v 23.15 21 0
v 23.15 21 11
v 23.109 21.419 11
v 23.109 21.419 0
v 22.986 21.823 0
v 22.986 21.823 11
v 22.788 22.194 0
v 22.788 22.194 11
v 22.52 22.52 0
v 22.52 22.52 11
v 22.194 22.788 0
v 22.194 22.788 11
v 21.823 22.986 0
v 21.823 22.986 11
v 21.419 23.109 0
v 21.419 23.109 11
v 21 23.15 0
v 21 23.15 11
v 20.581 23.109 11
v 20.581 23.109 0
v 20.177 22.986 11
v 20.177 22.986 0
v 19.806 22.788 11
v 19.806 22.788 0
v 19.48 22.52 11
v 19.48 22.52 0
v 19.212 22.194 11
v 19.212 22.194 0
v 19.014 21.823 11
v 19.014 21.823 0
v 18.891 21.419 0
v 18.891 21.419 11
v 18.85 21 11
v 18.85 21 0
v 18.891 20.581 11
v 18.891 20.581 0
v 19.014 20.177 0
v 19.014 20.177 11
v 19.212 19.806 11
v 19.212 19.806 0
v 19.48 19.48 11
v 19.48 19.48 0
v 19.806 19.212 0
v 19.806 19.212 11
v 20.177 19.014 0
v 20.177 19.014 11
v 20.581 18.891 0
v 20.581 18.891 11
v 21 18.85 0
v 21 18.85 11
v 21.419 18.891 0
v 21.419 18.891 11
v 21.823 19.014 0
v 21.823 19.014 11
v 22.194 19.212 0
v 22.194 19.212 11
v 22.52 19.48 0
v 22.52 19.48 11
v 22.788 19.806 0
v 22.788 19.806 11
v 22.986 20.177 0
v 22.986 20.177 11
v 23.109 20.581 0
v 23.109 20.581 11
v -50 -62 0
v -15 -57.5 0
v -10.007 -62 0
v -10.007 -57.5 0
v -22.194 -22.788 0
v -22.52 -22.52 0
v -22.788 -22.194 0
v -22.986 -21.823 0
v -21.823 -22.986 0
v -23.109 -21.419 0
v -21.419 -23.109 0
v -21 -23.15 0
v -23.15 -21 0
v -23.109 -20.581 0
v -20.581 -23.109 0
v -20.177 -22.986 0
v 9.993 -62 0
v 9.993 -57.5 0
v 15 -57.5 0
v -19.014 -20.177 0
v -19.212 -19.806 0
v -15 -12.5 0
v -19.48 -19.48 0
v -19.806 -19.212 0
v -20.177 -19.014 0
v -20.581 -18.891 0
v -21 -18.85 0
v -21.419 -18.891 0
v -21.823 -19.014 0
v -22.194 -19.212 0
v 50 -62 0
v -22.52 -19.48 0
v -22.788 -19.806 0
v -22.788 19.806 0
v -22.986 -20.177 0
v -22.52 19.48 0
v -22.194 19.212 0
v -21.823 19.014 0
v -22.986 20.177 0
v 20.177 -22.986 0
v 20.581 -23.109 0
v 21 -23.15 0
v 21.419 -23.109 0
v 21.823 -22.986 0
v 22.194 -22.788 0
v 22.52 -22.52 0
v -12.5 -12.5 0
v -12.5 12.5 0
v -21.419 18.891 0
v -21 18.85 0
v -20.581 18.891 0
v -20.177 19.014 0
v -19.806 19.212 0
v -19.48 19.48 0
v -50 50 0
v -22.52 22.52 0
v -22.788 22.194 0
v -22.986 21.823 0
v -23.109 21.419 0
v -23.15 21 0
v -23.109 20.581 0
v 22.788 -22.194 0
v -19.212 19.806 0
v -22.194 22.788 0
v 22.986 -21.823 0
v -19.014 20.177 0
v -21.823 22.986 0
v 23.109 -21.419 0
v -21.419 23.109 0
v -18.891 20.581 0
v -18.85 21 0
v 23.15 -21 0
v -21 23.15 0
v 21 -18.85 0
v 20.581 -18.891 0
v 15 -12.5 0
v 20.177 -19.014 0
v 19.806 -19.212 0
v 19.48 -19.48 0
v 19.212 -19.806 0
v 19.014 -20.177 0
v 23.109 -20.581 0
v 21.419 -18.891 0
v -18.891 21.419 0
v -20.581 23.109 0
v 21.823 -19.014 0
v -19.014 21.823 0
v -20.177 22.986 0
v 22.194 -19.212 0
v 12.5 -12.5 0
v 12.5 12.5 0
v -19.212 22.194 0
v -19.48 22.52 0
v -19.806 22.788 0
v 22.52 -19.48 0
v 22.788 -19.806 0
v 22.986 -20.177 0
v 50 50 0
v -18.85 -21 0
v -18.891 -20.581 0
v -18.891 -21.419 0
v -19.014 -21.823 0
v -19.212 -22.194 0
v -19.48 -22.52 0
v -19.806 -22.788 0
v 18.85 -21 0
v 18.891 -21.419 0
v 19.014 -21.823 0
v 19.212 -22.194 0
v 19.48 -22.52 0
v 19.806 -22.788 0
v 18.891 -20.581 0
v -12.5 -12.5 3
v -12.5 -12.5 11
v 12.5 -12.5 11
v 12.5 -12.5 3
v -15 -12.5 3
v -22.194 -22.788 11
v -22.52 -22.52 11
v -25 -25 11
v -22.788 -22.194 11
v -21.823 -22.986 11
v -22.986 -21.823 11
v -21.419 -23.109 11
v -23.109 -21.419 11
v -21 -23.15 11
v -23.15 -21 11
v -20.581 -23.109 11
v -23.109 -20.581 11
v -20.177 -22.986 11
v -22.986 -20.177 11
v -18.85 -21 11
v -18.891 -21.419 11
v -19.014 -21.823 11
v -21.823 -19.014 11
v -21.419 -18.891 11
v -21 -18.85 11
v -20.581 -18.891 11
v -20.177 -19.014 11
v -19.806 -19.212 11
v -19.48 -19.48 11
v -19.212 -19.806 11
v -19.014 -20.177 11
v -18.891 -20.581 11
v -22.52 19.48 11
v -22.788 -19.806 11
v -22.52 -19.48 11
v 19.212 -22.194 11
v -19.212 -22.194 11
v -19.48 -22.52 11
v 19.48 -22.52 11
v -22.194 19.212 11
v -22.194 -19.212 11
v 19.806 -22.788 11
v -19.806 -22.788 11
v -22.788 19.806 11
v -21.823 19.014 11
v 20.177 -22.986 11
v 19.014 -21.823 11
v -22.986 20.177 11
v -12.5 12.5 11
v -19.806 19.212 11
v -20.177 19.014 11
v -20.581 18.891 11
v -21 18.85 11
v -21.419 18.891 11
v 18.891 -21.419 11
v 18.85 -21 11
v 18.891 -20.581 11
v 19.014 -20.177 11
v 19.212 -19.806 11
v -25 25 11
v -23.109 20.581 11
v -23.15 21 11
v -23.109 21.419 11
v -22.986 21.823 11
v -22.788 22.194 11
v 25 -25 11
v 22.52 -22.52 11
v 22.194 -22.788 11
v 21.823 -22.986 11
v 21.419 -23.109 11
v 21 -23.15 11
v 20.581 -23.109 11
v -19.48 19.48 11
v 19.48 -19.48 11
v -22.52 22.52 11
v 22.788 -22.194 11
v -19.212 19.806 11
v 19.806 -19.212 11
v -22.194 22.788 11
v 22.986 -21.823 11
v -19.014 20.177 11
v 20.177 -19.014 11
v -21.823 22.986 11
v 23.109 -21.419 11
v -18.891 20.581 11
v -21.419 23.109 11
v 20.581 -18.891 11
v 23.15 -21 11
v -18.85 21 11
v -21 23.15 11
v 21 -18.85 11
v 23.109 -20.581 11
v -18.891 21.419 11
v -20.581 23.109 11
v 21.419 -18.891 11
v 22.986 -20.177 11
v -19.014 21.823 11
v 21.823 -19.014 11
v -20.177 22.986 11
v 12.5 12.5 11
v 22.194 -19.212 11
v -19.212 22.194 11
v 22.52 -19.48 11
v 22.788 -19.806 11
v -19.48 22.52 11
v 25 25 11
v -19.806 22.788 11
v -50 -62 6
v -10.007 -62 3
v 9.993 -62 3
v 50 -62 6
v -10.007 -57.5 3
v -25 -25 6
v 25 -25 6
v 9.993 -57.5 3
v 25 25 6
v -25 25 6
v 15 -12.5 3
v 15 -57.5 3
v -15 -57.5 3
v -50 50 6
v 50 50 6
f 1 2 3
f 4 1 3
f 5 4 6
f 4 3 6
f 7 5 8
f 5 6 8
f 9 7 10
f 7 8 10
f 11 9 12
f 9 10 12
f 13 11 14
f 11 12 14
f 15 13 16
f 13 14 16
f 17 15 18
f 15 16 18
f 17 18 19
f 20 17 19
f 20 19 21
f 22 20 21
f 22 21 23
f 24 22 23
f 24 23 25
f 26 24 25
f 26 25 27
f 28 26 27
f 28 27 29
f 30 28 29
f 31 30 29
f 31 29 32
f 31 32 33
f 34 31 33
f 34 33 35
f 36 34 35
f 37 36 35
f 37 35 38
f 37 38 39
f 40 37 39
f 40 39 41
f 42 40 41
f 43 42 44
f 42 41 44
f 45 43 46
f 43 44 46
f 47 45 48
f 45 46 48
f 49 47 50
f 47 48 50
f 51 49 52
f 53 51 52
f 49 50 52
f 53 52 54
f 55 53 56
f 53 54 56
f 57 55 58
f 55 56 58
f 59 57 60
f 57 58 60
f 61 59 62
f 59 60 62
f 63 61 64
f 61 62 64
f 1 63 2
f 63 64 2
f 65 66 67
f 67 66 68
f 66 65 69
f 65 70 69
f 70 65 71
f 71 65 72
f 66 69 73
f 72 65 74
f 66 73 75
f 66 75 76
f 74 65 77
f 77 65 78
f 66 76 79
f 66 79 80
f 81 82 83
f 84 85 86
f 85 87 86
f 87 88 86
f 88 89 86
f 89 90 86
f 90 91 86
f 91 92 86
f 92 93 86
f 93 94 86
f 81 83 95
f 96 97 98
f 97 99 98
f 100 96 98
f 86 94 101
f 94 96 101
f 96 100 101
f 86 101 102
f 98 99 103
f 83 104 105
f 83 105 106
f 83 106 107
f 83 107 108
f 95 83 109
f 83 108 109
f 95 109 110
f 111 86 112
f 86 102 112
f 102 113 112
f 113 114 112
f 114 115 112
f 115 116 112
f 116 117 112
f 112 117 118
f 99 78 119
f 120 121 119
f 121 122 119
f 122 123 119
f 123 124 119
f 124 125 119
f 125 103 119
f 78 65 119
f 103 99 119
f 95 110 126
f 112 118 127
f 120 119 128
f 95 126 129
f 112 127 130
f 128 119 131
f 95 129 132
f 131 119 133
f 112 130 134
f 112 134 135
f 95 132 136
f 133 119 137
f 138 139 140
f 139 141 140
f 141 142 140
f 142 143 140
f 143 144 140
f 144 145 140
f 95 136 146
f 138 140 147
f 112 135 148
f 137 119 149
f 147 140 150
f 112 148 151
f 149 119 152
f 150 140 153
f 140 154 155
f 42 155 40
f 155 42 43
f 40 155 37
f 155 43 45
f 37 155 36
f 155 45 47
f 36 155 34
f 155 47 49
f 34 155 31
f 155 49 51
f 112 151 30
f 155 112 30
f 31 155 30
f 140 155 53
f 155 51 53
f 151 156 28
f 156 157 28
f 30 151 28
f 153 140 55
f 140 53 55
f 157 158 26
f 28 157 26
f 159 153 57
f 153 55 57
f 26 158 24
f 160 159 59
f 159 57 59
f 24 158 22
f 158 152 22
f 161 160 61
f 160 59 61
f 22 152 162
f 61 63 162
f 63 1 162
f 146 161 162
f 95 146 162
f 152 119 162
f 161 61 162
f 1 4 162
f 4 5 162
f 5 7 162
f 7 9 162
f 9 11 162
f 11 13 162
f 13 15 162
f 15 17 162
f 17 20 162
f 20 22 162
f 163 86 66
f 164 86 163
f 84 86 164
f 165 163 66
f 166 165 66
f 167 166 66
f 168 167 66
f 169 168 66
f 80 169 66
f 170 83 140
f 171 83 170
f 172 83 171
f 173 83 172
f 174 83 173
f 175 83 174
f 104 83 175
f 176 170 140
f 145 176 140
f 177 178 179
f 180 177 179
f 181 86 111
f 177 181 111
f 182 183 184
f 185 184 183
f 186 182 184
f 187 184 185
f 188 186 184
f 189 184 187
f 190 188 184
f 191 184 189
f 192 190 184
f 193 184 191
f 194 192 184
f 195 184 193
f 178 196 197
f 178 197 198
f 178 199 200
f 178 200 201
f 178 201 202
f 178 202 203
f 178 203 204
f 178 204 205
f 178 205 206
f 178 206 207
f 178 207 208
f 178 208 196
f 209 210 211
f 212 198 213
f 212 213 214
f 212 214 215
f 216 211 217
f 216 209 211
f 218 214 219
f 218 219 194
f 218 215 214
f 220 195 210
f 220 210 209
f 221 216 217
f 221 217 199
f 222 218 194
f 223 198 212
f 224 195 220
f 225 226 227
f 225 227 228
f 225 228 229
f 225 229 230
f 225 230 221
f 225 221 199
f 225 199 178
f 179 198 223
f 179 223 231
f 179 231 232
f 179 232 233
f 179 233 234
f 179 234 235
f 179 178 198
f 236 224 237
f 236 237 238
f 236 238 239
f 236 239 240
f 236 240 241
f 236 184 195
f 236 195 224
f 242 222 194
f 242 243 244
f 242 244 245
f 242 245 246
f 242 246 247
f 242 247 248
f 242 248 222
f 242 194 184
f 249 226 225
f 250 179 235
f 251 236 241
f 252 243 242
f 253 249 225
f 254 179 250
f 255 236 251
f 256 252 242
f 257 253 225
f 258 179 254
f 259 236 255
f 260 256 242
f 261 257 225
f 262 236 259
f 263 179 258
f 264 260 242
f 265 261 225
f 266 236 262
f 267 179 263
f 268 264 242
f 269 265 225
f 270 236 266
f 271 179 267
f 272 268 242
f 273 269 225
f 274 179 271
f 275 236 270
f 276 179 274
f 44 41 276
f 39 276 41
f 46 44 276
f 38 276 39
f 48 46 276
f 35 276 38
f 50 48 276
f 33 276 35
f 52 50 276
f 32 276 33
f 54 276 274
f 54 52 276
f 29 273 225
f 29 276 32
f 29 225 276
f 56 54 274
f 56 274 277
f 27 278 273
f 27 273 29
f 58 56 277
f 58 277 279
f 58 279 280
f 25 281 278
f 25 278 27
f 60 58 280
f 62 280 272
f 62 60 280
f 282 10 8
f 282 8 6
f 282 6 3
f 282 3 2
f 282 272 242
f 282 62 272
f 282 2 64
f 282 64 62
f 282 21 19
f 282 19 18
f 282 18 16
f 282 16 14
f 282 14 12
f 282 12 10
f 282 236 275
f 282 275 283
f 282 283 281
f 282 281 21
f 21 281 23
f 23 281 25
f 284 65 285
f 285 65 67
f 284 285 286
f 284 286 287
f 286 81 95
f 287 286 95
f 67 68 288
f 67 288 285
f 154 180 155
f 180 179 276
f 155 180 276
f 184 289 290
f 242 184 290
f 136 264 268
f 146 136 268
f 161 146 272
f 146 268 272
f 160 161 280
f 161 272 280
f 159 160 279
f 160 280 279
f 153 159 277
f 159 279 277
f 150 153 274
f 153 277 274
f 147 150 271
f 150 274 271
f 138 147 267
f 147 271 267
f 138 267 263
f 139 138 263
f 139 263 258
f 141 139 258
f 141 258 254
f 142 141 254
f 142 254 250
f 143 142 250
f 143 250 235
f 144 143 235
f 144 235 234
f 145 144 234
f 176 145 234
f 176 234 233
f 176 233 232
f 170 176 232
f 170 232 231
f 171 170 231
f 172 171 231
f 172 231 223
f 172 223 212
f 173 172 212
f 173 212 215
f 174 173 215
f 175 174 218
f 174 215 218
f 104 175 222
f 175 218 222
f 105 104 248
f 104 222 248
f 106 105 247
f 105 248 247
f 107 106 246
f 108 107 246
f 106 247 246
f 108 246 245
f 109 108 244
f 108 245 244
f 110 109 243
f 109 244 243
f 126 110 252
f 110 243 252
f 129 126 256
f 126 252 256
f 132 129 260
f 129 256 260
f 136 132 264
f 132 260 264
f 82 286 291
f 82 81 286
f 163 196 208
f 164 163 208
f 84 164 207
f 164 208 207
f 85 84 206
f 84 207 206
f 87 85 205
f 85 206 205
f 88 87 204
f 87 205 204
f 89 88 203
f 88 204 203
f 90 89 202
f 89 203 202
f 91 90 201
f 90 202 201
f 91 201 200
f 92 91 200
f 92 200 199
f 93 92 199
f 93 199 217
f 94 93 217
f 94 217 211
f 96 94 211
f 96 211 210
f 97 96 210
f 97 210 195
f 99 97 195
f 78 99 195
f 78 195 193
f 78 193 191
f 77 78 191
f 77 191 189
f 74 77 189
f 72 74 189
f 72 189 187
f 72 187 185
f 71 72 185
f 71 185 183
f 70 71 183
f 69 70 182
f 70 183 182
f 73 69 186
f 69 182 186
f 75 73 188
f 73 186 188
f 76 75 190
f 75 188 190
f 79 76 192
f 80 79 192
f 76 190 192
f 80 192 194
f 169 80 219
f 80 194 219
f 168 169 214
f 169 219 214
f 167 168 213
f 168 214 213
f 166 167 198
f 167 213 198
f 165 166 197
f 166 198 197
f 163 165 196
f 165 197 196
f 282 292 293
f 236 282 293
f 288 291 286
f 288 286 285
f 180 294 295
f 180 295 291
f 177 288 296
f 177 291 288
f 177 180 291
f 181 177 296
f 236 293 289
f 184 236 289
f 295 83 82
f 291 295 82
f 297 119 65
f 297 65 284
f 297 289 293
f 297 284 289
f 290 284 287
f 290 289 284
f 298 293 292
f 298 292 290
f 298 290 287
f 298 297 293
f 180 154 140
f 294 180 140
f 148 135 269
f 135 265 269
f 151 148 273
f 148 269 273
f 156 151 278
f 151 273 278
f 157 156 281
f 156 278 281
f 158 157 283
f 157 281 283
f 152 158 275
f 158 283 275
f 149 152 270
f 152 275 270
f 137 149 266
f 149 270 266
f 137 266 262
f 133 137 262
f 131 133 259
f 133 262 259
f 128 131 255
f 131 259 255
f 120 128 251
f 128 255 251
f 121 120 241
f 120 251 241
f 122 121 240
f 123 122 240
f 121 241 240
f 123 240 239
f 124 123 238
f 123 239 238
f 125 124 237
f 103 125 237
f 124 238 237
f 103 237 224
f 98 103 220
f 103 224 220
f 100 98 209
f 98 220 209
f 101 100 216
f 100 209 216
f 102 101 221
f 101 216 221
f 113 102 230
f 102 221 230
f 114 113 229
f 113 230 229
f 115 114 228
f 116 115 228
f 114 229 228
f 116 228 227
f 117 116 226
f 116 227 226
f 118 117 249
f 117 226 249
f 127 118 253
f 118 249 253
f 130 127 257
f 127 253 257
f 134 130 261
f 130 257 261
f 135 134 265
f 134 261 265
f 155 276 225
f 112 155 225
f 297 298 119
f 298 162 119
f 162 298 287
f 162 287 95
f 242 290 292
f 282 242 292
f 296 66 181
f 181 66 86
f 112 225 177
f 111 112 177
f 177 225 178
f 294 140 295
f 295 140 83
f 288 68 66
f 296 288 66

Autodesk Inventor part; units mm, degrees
ref_plane "YZ Plane" through (0, 0, 0) normal (1, 0, 0) x (0, 1, 0)
ref_plane "XZ Plane" through (0, 0, 0) normal (0, 1, 0) x (-1, 0, 0)
ref_plane "XY Plane" through (0, 0, 0) normal (0, 0, 1) x (1, 0, 0)
sketch "草图1" plane through (0, 0, 0) normal (0, 0, 1) x (1, 0, 0)
  line L0 (-50, -50) -> (50, -50)
  line L1 (50, -50) -> (50, 50)
  line L2 (50, 50) -> (-50, 50)
  line L3 (-50, 50) -> (-50, -50)
  line L4 (-50, -50) -> (50, 50) construction
  line L5 (50, -50) -> (-50, 50) construction
  point P0 (0, 0)
  dimension "d0" = 100
  dimension "d1" = 100
extrude "拉伸1" add sketch "草图1" along normal blind 6
sketch "草图2" plane through (0, 0, 6) normal (0, 0, 1) x (1, 0, 0)
  line L0 (-25, -25) -> (25, -25)
  line L1 (25, -25) -> (25, 25)
  line L2 (25, 25) -> (-25, 25)
  line L3 (-25, 25) -> (-25, -25)
  line L4 (-25, -25) -> (25, 25) construction
  line L5 (25, -25) -> (-25, 25) construction
  point P0 (0, 0)
  dimension "d4" = 50
  dimension "d5" = 50
extrude "拉伸2" add sketch "草图2" along normal blind 5
sketch "草图3" plane through (0, 0, 11) normal (0, 0, 1) x (1, 0, 0)
  line L0 (-17.5, -17.5) -> (17.5, -17.5)
  line L1 (17.5, -17.5) -> (17.5, 17.5)
  line L2 (17.5, 17.5) -> (-17.5, 17.5)
  line L3 (-17.5, 17.5) -> (-17.5, -17.5)
  line L4 (-17.5, -17.5) -> (17.5, 17.5) construction
  line L5 (17.5, -17.5) -> (-17.5, 17.5) construction
  point P0 (0, 0)
  dimension "d8" = 35
  dimension "d9" = 35
extrude "拉伸3" cut sketch "草图3" against normal through all
sketch "草图4" plane through (0, 0, 11) normal (0, 0, 1) x (1, 0, 0)
  line L0 (-21, -21) -> (21, -21)
  line L1 (21, -21) -> (21, 21)
  line L2 (21, 21) -> (-21, 21)
  line L3 (-21, 21) -> (-21, -21)
  line L4 (-21, -21) -> (21, 21) construction
  line L5 (21, -21) -> (-21, 21) construction
  circle A0 centre (21, 21) radius 2.15
  circle A1 centre (-21, 21) radius 2.15
  circle A2 centre (21, -21) radius 2.15
  circle A3 centre (-21, -21) radius 2.15
  point P0 (0, 0)
  dimension "d12" = 42
  dimension "d13" = 42
  dimension "d14" = 4.3
  dimension "d15" = 4.3
  dimension "d16" = 4.3
  dimension "d17" = 4.3
extrude "拉伸4" cut sketch "草图4" against normal through all contours L3 A3 L0 | L0 A3 L3 | A2 L1 L0 | L0 L1 A2 | A1 L2 L3 | L3 L2 A1 | A0 L2 L1 | L1 L2 A0
sketch "草图5" plane through (0, 0, 0) normal (0, 0, -1) x (-1, 0, 0)
  line L0 (15, 22.5) -> (-15, 22.5)
  line L1 (-15, -17.5) -> (-15, -57.5)
  line L2 (-15, -57.5) -> (15, -57.5)
  line L3 (15, -57.5) -> (15, -17.5)
  line L4 (17.5, -17.5) -> (-17.5, -17.5) projected
  line L5 (15, 22.5) -> (-15, -57.5) construction
  line L6 (-15, 22.5) -> (15, -57.5) construction
  line L7 (-15, -17.5) -> (15, -17.5)
  line L8 (12.5, -12.5) -> (-12.5, -12.5)
  line L9 (-12.5, -12.5) -> (-12.5, 12.5)
  line L10 (-12.5, 12.5) -> (12.5, 12.5)
  line L11 (12.5, 12.5) -> (12.5, -12.5)
  line L12 (12.5, -12.5) -> (-12.5, 12.5) construction
  line L13 (-12.5, -12.5) -> (12.5, 12.5) construction
  line L14 (17.5, -17.5) -> (-17.5, -17.5)
  line L15 (-17.5, -17.5) -> (-17.5, 17.5)
  line L16 (-17.5, 17.5) -> (17.5, 17.5)
  line L17 (17.5, 17.5) -> (17.5, -17.5)
  line L18 (17.5, -17.5) -> (-17.5, 17.5) construction
  line L19 (-17.5, -17.5) -> (17.5, 17.5) construction
  point P0 (0, 0)
  point P1 (0, -17.5)
  dimension "d20" = 30
  dimension "d21" = 80
  dimension "d22" = 30
  dimension "d23" = 40
  dimension "d31" = 25
  dimension "d32" = 25
sketch "草图6" plane through (-50, -50, 0) normal (0, -1, 0) x (1, 0, 0)
  line L0 (0, 0) -> (0, 6) projected
  line L1 (100, 0) -> (0, 0)
  line L2 (0, 0) -> (0, 6)
  line L3 (0, 6) -> (100, 6)
  line L4 (100, 6) -> (100, 0)
  point P0 (50, 0)
extrude "拉伸5" add sketch "草图6" along normal blind 15
sketch "草图7" plane through (0, 0, 0) normal (0, 0, -1) x (-1, 0, 0)
  point P0 (0, 0)
extrude "拉伸6" cut sketch "草图5" against normal blind 3 contours L4 L3 L2 L1
sketch "草图8" plane through (0, 0, 0) normal (0, 0, -1) x (-1, 0, 0)
  line L0 (15, -57.5) -> (-15, -57.5) projected
  line L1 (-9.993, -57.5) -> (10.007, -57.5)
  line L2 (10.007, -57.5) -> (10.007, -69.9689)
  line L3 (10.007, -69.9689) -> (-9.993, -69.9689)
  line L4 (-9.993, -69.9689) -> (-9.993, -57.5)
  line L5 (10.007, -69.9689) -> (0.007, -69.9689)
  point P0 (0, 0)
  dimension "d28" = 20
extrude "拉伸7" cut sketch "草图8" against normal blind 3
sketch "草图9" plane through (0, 0, 11) normal (0, 0, 1) x (1, 0, 0)
  line L0 (17.5, 17.5) -> (17.5, -17.5) projected
  line L1 (-17.5, -17.5) -> (17.5, -17.5)
  line L2 (17.5, -17.5) -> (17.5, 17.5)
  line L3 (17.5, 17.5) -> (-17.5, 17.5)
  line L4 (-17.5, 17.5) -> (-17.5, -17.5)
  line L5 (-17.5, -17.5) -> (17.5, 17.5) construction
  line L6 (17.5, -17.5) -> (-17.5, 17.5) construction
  line L7 (-12.5, -12.5) -> (12.5, -12.5)
  line L8 (12.5, -12.5) -> (12.5, 12.5)
  line L9 (12.5, 12.5) -> (-12.5, 12.5)
  line L10 (-12.5, 12.5) -> (-12.5, -12.5)
  line L11 (-12.5, -12.5) -> (12.5, 12.5) construction
  line L12 (12.5, -12.5) -> (-12.5, 12.5) construction
  point P0 (0, 0)
  dimension "d33" = 25
  dimension "d34" = 25
extrude "拉伸8" add sketch "草图9" against normal blind 11
sketch "草图10" plane through (0, 0, 0) normal (0, 0, -1) x (-1, 0, 0)
  line L0 (-15, -57.5) -> (-15, -17.5) projected
  line L1 (-15, -17.5) -> (15, -17.5)
  line L2 (15, -17.5) -> (15, -12.5)
  line L3 (15, -12.5) -> (-15, -12.5)
  line L4 (-15, -12.5) -> (-15, -17.5)
  point P0 (0, 0)
  dimension "d37" = 5
extrude "拉伸9" cut sketch "草图10" against normal blind 3
sketch "草图11" plane through (0, 0, 0) normal (0, 0, -1) x (-1, 0, 0)
  line L0 (-50, -65) -> (-50, 50) projected
  line L1 (-50, -65) -> (-34.1728, -65)
  line L2 (-34.1728, -65) -> (-34.1728, -62)
  line L3 (-34.1728, -62) -> (-50, -62)
  line L4 (-50, -62) -> (-50, -65)
  line L5 (50, 50) -> (50, -65) projected
  line L6 (-50, -65) -> (50, -65)
  line L7 (50, -65) -> (50, -62)
  line L8 (50, -62) -> (-50, -62)
  line L9 (-50, -62) -> (-50, -65)
  point P0 (0, 0)
  dimension "d40" = 3
extrude "拉伸10" cut sketch "草图11" against normal blind 11
properties part number "11"
